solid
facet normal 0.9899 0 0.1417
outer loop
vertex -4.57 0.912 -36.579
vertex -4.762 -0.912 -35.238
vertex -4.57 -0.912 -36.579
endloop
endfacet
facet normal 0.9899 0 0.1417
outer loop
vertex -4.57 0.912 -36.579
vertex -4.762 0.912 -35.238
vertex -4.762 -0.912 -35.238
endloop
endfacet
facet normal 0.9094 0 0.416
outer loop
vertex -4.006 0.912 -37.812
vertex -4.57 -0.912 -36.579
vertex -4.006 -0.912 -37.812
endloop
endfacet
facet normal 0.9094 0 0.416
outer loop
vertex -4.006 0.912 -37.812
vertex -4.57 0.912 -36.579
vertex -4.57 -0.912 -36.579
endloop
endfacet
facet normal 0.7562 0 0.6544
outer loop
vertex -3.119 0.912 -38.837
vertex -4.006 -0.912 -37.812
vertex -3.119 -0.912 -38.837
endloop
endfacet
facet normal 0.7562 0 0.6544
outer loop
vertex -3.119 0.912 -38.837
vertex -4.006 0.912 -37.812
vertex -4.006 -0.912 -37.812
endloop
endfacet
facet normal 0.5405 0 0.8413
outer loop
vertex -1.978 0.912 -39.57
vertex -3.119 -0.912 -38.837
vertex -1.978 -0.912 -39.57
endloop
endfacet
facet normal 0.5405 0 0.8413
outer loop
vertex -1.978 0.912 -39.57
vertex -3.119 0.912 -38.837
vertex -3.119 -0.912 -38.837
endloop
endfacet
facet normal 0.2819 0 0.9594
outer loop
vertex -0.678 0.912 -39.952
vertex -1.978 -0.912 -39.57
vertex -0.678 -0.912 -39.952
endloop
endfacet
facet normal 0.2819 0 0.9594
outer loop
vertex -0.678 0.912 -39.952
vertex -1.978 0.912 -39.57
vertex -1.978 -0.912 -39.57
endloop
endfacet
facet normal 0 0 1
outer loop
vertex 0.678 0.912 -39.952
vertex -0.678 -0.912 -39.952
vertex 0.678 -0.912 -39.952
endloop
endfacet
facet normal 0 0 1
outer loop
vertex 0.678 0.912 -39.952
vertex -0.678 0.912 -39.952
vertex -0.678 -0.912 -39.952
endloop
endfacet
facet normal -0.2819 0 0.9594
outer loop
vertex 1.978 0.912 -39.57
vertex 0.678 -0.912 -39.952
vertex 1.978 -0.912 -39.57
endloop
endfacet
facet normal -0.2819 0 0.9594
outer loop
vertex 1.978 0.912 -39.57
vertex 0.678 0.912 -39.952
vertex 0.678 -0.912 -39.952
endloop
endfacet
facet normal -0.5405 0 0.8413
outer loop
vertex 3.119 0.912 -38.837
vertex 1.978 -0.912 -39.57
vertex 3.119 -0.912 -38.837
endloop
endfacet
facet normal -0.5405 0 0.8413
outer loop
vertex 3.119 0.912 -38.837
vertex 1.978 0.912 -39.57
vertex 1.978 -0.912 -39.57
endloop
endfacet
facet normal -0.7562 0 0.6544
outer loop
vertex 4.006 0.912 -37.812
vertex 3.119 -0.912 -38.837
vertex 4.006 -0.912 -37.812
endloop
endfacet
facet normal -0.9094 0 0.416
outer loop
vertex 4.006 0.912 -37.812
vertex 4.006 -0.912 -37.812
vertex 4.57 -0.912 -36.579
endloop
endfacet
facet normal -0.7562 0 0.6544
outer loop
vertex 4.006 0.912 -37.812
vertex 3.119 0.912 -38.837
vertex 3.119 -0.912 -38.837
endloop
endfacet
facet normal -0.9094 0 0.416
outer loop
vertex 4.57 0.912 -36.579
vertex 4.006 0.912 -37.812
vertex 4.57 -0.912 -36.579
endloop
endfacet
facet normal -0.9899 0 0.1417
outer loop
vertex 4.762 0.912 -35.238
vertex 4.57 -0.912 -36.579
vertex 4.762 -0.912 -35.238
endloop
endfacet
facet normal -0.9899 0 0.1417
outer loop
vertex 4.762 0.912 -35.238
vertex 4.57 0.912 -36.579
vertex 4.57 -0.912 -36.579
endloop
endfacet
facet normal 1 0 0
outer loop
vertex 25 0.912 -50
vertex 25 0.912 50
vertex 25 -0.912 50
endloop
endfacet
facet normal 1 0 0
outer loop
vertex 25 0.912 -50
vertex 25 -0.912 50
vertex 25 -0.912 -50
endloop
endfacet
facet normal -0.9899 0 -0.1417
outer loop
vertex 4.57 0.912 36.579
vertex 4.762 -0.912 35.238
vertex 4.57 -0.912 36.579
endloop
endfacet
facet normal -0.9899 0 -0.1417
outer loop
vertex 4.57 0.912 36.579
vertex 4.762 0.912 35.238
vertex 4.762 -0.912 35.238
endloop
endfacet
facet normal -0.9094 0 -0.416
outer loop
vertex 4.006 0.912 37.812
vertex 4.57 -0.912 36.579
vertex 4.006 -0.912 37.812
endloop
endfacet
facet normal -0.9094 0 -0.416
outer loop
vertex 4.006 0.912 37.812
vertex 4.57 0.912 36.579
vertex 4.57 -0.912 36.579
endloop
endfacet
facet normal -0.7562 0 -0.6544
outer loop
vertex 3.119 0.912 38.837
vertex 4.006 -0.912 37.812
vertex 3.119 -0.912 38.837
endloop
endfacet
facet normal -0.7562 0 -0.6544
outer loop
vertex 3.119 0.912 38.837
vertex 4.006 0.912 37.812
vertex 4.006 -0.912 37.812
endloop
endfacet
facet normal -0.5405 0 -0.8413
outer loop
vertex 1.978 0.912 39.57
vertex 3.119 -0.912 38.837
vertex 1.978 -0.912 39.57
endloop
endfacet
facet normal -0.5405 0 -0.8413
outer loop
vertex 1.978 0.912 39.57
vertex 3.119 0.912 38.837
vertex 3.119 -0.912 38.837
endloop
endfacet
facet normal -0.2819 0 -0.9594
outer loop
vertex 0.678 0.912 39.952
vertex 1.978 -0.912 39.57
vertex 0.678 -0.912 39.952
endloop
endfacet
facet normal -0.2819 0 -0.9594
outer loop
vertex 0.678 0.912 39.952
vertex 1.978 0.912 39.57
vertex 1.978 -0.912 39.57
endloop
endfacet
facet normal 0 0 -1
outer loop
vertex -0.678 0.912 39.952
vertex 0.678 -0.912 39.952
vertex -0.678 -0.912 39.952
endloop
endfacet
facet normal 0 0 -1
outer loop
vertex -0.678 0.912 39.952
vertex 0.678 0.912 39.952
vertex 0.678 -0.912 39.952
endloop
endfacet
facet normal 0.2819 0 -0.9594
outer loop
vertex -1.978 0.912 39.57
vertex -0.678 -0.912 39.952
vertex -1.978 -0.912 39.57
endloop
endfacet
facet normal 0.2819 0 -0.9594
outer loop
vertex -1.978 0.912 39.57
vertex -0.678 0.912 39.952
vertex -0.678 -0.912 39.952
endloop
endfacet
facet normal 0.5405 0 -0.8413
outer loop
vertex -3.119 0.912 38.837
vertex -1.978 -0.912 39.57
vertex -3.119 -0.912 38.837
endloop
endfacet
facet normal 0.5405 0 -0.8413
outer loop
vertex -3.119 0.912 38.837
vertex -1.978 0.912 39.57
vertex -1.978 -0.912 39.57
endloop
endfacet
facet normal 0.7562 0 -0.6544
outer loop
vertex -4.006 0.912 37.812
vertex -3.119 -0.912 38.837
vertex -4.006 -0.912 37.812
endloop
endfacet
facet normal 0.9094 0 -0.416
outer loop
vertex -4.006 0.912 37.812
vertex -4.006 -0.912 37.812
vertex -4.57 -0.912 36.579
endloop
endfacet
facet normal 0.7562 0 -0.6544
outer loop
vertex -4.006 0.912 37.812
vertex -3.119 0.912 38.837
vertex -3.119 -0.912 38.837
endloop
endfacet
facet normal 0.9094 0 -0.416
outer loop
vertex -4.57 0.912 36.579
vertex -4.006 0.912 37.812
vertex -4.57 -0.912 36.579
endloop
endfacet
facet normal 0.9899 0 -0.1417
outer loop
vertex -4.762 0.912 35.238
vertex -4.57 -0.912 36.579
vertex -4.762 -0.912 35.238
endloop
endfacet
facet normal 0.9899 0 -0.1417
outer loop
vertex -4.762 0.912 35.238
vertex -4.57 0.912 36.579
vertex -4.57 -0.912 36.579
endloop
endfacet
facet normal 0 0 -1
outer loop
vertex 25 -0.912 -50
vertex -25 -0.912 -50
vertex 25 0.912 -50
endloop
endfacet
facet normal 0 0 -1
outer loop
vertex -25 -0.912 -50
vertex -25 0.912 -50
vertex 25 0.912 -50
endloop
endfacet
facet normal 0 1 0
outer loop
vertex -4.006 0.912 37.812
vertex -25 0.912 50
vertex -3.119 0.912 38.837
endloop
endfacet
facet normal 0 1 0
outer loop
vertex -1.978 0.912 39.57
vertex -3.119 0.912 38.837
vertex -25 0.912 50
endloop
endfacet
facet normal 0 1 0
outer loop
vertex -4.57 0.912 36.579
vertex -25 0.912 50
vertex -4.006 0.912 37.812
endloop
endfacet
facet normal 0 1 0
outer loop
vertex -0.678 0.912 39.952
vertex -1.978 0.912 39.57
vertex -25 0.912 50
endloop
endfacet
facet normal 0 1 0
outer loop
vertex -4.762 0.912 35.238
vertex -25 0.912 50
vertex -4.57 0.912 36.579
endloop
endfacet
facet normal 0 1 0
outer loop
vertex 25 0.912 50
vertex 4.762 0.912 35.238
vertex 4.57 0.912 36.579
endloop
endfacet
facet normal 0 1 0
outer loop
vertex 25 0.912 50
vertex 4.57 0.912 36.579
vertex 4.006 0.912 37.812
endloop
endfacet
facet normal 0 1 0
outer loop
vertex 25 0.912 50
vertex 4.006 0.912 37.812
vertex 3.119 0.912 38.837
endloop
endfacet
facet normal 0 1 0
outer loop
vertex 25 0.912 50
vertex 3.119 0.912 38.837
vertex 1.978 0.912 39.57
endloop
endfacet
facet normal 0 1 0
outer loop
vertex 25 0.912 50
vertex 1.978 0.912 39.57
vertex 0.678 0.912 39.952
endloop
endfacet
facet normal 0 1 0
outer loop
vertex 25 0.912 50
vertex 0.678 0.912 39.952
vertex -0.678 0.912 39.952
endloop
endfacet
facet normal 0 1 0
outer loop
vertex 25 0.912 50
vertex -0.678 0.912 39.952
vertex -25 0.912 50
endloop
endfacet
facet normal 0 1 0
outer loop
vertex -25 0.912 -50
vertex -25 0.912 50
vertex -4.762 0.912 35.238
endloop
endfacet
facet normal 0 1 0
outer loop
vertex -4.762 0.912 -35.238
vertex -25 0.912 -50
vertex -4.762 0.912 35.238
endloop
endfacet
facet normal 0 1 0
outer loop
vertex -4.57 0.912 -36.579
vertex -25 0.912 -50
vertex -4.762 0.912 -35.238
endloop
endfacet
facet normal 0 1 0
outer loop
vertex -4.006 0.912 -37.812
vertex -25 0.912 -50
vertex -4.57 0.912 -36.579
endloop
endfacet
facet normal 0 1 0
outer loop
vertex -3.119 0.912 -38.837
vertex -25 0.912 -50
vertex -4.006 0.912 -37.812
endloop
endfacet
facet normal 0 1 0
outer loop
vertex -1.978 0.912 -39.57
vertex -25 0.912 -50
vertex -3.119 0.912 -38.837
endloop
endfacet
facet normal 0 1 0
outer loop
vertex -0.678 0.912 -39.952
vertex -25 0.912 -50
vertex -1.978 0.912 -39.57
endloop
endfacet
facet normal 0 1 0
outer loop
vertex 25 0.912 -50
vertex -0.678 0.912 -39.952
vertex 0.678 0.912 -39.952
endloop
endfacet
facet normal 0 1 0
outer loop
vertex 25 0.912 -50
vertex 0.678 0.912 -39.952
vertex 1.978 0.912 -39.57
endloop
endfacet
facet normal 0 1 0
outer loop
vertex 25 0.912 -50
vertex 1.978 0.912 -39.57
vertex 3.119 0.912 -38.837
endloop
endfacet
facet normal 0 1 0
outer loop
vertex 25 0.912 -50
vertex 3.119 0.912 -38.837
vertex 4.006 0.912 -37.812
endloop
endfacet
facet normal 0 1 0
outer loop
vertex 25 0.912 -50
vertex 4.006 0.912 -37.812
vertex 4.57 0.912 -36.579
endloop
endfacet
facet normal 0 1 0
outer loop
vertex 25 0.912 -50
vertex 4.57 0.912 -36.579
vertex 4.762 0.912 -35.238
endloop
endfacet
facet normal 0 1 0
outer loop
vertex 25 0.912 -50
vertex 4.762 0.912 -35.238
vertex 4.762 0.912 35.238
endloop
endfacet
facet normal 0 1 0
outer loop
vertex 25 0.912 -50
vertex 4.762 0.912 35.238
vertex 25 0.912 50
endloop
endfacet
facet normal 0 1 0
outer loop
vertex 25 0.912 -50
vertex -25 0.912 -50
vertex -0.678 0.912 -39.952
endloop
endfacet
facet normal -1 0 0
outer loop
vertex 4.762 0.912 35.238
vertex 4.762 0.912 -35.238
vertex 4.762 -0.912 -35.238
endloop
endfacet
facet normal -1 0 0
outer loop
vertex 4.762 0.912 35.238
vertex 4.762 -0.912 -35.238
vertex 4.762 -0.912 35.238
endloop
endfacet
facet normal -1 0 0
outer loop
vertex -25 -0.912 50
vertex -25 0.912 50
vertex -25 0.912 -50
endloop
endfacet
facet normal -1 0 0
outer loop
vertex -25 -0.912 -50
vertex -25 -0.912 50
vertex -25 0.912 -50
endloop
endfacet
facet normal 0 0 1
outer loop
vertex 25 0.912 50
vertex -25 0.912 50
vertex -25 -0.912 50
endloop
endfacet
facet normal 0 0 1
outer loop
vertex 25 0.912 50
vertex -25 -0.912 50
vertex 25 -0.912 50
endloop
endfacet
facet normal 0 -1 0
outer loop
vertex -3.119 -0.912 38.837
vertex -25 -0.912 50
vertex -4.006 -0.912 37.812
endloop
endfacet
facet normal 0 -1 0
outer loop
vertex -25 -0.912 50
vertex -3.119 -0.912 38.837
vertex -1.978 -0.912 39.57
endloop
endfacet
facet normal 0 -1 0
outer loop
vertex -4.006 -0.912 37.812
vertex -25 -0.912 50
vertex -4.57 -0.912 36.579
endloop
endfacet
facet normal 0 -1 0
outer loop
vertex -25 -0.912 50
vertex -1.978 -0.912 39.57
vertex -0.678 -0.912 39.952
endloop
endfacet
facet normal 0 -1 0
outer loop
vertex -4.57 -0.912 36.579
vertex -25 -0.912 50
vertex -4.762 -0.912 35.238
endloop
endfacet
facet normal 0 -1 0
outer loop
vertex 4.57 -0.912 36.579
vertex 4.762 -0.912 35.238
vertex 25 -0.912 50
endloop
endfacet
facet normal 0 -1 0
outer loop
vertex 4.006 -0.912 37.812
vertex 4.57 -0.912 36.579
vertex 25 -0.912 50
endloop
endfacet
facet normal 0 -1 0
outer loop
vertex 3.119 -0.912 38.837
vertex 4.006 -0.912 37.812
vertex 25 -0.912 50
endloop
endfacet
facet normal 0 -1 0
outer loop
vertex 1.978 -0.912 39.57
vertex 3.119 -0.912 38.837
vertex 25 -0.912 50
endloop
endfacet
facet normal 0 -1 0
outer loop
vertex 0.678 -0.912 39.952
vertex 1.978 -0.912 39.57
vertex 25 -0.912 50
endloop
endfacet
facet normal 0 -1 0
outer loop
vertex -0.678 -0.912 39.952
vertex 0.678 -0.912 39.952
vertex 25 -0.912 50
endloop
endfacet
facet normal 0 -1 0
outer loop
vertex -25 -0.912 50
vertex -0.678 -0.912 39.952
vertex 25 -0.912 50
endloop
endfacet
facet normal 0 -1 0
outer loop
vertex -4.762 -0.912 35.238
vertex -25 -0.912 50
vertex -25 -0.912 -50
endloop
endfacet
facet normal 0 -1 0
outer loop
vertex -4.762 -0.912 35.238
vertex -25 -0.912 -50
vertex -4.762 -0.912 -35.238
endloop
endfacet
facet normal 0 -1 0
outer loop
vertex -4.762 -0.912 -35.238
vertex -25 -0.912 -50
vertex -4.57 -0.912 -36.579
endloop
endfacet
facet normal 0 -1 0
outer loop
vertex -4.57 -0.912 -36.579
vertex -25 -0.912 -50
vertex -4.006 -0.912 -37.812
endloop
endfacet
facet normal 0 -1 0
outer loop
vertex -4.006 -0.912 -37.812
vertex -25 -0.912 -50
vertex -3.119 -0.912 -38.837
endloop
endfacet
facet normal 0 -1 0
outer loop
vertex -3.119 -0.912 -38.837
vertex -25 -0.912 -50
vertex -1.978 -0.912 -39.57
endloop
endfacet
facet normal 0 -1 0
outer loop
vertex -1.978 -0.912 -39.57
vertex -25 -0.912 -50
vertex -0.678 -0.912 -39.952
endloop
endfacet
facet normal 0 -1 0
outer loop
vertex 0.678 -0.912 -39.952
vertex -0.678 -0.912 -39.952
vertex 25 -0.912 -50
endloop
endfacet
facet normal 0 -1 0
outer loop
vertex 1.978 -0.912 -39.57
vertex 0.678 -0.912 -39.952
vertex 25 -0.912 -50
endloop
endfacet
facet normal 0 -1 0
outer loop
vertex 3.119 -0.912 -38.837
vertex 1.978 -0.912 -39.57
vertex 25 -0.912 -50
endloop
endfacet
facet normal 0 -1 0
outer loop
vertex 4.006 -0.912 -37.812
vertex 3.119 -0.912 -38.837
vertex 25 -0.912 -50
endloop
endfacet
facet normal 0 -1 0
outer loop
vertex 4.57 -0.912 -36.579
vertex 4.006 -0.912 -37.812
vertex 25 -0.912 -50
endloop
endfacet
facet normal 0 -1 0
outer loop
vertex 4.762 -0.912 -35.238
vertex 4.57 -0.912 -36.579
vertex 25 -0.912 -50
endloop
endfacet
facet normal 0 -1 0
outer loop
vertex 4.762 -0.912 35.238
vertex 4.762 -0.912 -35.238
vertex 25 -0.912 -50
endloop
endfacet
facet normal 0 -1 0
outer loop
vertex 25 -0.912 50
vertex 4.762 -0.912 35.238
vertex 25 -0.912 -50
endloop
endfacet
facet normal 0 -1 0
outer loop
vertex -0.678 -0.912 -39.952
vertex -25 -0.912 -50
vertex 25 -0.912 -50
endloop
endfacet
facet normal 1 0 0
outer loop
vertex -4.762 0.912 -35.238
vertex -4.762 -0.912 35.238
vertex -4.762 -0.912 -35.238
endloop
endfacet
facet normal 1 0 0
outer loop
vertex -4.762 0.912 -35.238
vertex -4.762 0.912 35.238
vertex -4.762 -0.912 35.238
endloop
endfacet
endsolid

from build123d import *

# Parameters (mm, degrees)
BOSS_EXTRUDE1_DEPTH      = 0.9125
BOSS_EXTRUDE1_DEPTH_BACK = 0.9125
SKETCH1_W                = 50
SKETCH1_H                = 100


with BuildPart() as part:
    # Sketch1 → Boss-Extrude1 (new, two sides: drawn at the far end of the back side and taken through both)
    with BuildSketch(Plane(origin=(0, 0, 0), x_dir=(1, 0, 0), z_dir=(0, 1, 0)).offset(-BOSS_EXTRUDE1_DEPTH_BACK)):
        Rectangle(SKETCH1_W, SKETCH1_H)
        with BuildLine():
            Line((4.7625, 35.2375), (4.7625, -35.2375))
            ThreePointArc((4.7625, -35.2375), (0, -40), (-4.7625, -35.2375))
            Line((-4.7625, -35.2375), (-4.7625, 35.2375))
            ThreePointArc((-4.7625, 35.2375), (0, 40), (4.7625, 35.2375))
        make_face(mode=Mode.SUBTRACT)
    extrude(amount=BOSS_EXTRUDE1_DEPTH + BOSS_EXTRUDE1_DEPTH_BACK)


solid = part.part
